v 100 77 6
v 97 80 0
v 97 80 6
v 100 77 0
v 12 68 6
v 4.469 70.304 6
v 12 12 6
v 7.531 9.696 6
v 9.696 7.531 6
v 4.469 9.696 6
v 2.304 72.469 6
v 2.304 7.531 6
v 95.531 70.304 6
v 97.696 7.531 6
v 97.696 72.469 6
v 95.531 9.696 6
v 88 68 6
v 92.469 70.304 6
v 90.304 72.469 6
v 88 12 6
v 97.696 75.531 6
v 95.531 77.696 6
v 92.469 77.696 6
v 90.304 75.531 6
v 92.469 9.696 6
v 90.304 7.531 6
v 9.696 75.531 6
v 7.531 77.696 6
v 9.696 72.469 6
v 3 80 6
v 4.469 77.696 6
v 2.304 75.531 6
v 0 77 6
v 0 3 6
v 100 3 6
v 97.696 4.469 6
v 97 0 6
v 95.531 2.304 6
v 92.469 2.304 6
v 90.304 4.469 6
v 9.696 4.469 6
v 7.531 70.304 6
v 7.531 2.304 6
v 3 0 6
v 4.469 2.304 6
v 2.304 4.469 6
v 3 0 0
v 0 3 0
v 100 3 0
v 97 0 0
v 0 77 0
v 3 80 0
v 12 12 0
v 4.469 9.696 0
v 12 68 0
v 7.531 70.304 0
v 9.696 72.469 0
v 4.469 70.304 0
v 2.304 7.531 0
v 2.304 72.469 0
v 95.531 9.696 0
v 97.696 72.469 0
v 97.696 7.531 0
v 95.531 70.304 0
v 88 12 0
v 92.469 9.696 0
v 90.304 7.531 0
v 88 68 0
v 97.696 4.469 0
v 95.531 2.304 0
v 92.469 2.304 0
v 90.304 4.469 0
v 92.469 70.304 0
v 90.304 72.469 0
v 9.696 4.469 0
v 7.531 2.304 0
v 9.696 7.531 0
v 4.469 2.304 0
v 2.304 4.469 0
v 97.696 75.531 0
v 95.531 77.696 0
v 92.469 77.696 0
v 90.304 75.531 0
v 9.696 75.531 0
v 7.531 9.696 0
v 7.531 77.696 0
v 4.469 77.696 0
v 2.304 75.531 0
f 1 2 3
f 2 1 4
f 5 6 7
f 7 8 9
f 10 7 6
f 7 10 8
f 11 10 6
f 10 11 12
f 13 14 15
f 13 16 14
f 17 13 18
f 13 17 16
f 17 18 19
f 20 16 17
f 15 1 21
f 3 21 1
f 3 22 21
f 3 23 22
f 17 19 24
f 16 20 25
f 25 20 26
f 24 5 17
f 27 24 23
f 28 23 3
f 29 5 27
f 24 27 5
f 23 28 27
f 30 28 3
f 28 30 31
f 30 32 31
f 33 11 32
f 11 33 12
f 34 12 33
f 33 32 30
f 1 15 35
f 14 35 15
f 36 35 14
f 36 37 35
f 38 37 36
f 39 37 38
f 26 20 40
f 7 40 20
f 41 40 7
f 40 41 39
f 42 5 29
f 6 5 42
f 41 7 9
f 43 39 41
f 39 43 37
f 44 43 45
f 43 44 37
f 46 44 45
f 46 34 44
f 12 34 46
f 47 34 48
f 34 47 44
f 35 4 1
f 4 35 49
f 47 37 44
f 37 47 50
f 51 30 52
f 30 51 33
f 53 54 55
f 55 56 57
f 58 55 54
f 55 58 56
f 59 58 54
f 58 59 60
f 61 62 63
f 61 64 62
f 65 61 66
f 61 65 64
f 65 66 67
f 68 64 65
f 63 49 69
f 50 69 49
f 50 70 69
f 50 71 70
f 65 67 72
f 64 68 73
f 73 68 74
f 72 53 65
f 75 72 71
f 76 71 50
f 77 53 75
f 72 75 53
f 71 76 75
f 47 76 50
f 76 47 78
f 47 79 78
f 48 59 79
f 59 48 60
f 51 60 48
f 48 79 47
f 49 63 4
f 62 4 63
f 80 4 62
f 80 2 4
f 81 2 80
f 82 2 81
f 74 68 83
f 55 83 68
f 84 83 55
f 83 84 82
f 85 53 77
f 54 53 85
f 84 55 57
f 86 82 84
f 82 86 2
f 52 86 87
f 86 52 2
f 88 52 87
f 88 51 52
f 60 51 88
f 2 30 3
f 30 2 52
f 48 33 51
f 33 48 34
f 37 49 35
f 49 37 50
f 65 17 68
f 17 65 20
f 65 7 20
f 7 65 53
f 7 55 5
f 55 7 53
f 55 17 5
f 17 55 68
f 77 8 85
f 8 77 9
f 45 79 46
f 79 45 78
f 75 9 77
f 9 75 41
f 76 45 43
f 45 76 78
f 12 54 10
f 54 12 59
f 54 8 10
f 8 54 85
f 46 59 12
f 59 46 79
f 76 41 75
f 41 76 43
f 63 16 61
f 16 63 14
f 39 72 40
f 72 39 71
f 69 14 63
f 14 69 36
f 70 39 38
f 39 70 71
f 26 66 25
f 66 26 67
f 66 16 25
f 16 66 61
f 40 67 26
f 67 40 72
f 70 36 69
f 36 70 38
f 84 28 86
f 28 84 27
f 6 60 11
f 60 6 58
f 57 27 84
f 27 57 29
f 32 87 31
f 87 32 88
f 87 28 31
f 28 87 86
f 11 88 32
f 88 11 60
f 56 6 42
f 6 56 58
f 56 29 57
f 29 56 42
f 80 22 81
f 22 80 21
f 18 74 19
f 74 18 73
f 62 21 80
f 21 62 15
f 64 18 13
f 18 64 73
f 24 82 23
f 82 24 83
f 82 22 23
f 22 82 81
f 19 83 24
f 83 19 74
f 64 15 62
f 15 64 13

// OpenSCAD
$fn = 32;

// ----------------------------------------------------------------------
// Frame plate: 100 x 80 frame, 12 mm rails
// ----------------------------------------------------------------------

// --- parameters (mm) ---
plate_l = 100;            // plate length, X
plate_w = 80;             // plate width, Y
plate_t = 6;              // plate thickness, Z (extrusion height)
corner_c = 3;             // corner chamfer
frame_bar = 12;           // frame rail width
bolt_r = 4;               // corner bolt window radius
bolt_inset = 6;           // bolt centre inset from the edges
fit_tol = 0.05;           // declared fit tolerance (prompt contract)
free_tol = 0.3;           // declared free tolerance (prompt contract)

win_l = plate_l - 2 * frame_bar;  // window length
win_w = plate_w - 2 * frame_bar;  // window width
bolt_d = 2 * bolt_r;  // corner hole diameter

profile = [[3, 0], [97, 0], [100, 3], [100, 77], [97, 80], [3, 80], [0, 77], [0, 3]];  // primary outline, 8 points, counter clockwise
void_1 = [[12, 12], [88, 12], [88, 68], [12, 68]];  // the window, 4 points
void_2 = [[9.696, 7.531], [7.531, 9.696], [4.469, 9.696], [2.304, 7.531], [2.304, 4.469], [4.469, 2.304], [7.531, 2.304], [9.696, 4.469]];  // corner bolt window, 8 points
void_3 = [[97.696, 7.531], [95.531, 9.696], [92.469, 9.696], [90.304, 7.531], [90.304, 4.469], [92.469, 2.304], [95.531, 2.304], [97.696, 4.469]];  // corner bolt window, 8 points
void_4 = [[9.696, 75.531], [7.531, 77.696], [4.469, 77.696], [2.304, 75.531], [2.304, 72.469], [4.469, 70.304], [7.531, 70.304], [9.696, 72.469]];  // corner bolt window, 8 points
void_5 = [[97.696, 75.531], [95.531, 77.696], [92.469, 77.696], [90.304, 75.531], [90.304, 72.469], [92.469, 70.304], [95.531, 70.304], [97.696, 72.469]];  // corner bolt window, 8 points

// --- the one profile operation ---
difference() {
  linear_extrude(height = plate_t) polygon(points = profile);
  translate([0, 0, -1])
    linear_extrude(height = plate_t + 2) polygon(points = void_1);
  translate([0, 0, -1])
    linear_extrude(height = plate_t + 2) polygon(points = void_2);
  translate([0, 0, -1])
    linear_extrude(height = plate_t + 2) polygon(points = void_3);
  translate([0, 0, -1])
    linear_extrude(height = plate_t + 2) polygon(points = void_4);
  translate([0, 0, -1])
    linear_extrude(height = plate_t + 2) polygon(points = void_5);
}
